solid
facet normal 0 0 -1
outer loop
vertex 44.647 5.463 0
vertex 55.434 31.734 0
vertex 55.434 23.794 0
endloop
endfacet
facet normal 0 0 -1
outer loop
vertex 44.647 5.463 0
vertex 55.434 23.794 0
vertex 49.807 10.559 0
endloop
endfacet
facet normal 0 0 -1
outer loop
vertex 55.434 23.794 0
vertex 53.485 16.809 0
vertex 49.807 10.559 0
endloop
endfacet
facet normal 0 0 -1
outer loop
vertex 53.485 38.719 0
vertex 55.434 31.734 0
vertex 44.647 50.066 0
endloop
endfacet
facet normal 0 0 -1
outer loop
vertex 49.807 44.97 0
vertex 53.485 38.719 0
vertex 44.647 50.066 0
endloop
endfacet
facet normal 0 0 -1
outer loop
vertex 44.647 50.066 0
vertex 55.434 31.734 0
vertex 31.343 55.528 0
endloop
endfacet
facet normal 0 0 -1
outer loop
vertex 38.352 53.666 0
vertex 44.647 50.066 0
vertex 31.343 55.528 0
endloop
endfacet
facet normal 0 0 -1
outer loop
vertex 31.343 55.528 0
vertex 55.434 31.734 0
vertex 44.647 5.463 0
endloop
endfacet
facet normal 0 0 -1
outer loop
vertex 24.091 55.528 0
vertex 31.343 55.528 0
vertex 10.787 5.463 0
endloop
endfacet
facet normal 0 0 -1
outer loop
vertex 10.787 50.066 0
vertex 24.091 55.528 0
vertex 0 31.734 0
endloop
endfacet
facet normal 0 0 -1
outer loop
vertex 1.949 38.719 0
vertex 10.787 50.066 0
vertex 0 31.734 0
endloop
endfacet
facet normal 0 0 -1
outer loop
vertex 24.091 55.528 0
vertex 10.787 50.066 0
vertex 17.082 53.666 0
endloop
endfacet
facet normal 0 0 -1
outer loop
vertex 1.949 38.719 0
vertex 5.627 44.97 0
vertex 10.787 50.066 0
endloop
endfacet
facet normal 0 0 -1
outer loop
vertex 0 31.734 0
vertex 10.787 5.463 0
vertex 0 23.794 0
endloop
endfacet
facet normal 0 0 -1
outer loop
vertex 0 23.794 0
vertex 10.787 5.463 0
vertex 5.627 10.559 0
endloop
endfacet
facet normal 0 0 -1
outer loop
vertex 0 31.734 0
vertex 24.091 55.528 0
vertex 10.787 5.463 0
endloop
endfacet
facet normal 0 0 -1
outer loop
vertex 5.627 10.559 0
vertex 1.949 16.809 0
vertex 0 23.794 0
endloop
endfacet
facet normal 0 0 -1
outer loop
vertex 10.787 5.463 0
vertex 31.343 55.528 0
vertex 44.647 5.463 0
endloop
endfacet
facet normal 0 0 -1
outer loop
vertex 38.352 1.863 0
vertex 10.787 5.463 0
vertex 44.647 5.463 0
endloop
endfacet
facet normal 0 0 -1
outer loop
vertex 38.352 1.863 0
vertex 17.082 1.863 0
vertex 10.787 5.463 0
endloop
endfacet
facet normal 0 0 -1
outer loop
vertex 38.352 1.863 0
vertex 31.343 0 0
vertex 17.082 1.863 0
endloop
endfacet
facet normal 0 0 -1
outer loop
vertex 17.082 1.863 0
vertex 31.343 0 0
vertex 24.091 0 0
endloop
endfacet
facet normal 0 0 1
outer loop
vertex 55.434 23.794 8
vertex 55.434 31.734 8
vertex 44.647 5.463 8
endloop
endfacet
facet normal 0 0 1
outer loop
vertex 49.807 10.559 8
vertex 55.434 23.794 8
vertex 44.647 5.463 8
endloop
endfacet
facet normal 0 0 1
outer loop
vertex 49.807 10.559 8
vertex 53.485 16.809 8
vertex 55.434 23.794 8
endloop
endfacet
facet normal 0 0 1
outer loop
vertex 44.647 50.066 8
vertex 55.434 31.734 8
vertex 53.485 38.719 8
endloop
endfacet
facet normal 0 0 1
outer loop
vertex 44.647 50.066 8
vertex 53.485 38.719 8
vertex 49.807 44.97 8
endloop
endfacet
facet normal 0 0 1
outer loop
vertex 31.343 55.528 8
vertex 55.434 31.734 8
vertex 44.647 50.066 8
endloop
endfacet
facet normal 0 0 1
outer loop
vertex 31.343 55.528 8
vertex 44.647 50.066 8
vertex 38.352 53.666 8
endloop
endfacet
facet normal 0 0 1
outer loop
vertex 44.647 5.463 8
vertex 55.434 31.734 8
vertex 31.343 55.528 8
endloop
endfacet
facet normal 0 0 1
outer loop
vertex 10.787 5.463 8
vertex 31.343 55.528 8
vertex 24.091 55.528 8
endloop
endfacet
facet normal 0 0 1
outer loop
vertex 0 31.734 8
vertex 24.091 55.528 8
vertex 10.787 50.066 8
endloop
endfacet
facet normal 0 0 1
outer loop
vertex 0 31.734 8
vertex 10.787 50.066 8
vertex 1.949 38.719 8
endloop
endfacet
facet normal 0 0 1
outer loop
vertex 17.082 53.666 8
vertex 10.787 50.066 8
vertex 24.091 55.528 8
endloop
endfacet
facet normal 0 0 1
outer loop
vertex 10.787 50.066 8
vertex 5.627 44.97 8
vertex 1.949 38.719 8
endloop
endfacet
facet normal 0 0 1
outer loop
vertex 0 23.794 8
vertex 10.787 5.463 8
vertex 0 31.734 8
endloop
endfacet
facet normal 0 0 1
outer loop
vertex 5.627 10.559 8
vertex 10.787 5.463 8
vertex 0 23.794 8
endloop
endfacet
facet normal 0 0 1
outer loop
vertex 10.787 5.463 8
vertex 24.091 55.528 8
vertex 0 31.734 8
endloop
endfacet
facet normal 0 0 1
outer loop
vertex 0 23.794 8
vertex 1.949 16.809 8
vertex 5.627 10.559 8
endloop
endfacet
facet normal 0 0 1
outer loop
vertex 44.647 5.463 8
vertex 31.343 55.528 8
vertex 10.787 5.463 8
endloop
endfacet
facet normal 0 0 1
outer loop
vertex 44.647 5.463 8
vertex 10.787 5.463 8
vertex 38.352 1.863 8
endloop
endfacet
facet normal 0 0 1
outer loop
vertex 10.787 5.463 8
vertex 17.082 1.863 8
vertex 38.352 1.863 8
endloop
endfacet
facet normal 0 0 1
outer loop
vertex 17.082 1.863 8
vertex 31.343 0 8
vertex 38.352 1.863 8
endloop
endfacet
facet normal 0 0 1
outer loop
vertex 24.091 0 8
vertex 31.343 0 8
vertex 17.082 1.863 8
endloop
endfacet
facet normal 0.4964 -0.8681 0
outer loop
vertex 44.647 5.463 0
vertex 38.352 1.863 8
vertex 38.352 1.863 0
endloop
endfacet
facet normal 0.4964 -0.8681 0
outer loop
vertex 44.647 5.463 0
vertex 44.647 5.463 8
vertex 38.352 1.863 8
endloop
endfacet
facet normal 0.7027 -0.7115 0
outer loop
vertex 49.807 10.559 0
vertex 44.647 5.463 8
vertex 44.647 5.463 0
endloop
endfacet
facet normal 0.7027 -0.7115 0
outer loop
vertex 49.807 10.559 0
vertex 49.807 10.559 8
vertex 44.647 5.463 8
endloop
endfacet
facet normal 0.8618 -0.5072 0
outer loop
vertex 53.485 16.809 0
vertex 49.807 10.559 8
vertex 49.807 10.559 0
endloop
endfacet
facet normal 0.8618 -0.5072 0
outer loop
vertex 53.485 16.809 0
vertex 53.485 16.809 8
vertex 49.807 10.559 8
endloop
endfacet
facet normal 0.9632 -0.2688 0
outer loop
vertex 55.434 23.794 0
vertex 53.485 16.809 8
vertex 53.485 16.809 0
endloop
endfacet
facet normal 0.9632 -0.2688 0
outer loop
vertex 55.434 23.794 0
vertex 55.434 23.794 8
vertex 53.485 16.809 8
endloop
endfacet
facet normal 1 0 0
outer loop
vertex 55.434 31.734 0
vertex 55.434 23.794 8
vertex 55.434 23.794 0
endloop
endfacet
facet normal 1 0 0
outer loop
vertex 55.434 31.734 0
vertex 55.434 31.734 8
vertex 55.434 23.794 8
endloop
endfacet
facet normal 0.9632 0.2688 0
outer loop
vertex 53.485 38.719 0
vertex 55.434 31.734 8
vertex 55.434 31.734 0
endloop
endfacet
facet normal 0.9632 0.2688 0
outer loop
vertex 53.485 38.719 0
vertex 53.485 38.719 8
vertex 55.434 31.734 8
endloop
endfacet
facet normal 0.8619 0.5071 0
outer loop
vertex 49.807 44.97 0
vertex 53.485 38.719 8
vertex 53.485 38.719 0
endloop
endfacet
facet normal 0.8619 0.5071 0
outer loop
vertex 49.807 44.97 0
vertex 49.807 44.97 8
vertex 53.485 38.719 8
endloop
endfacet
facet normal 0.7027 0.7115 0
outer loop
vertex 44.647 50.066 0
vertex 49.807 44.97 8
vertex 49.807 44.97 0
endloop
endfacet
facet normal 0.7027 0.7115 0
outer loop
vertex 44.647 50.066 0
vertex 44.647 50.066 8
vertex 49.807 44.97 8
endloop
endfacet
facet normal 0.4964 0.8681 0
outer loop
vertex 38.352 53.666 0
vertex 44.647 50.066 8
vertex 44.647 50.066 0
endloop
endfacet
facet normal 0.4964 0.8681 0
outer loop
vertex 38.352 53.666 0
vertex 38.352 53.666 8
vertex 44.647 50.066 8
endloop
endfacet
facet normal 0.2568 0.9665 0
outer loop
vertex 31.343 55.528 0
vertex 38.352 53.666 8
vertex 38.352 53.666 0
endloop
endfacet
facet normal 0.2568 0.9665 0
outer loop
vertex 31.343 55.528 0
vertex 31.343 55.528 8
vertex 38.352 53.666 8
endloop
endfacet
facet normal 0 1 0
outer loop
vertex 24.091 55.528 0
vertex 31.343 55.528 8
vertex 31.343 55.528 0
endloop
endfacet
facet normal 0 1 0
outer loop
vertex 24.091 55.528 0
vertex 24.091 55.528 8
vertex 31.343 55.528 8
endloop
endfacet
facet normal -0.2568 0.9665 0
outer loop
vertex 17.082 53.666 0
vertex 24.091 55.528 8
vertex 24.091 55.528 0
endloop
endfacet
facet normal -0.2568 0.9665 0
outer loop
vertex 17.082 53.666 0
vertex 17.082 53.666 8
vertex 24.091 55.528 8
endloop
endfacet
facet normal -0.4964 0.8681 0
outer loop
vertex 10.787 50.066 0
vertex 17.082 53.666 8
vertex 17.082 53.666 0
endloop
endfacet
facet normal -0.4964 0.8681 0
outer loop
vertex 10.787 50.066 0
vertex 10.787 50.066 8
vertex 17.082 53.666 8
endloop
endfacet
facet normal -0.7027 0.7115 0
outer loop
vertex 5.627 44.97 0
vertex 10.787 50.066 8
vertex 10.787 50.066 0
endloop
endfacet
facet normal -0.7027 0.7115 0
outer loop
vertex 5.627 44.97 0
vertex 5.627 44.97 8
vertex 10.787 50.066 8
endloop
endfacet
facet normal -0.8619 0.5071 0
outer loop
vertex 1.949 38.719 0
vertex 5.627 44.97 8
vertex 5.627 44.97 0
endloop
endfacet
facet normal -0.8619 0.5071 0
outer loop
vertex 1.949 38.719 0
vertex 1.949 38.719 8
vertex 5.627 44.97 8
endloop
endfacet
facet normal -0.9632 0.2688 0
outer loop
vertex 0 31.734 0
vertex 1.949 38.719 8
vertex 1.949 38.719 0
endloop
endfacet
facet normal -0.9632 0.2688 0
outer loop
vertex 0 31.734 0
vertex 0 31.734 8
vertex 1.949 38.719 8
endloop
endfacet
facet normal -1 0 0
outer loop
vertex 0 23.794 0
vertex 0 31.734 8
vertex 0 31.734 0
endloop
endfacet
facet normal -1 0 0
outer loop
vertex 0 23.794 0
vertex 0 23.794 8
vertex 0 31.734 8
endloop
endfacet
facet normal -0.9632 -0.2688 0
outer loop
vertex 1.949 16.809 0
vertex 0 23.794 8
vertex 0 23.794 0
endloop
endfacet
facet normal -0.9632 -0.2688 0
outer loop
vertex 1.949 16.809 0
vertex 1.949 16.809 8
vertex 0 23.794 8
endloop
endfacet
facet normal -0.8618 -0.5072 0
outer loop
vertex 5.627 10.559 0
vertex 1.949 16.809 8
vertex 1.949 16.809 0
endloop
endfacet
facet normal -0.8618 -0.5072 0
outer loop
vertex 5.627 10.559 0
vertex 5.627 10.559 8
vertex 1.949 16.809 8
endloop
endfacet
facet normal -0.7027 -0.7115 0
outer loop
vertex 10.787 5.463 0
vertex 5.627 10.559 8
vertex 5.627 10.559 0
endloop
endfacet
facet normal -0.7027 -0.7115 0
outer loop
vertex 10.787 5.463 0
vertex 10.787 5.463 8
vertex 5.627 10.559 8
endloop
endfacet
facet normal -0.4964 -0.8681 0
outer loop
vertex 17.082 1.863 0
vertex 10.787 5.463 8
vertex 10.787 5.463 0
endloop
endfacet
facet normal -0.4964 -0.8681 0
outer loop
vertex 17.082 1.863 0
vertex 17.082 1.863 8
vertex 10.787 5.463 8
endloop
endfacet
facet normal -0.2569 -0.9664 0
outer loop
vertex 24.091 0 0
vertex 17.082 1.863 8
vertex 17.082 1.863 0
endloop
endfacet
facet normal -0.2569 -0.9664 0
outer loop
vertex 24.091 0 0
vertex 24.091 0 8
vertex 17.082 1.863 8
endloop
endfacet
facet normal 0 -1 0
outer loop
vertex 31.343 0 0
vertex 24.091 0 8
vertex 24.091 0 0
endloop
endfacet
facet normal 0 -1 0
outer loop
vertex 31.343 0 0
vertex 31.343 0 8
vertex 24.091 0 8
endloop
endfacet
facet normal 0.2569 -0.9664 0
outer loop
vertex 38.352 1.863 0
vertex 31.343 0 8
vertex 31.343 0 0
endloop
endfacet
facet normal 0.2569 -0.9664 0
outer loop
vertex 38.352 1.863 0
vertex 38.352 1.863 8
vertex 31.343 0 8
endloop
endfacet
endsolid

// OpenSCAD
$fn = 32;

// ----------------------------------------------------------------------
// Flat adaptor: double_d, 8 mm thick
// ----------------------------------------------------------------------

// --- parameters (mm) ---
profile_height = 8;       // extrusion height
profile_points = 24;      // points of the closed outline

profile = [[55.434, 31.734], [53.485, 38.719], [49.807, 44.97], [44.647, 50.066], [38.352, 53.666], [31.343, 55.528], [24.091, 55.528], [17.082, 53.666], [10.787, 50.066], [5.627, 44.97], [1.949, 38.719], [0, 31.734], [0, 23.794], [1.949, 16.809], [5.627, 10.559], [10.787, 5.463], [17.082, 1.863], [24.091, 0], [31.343, 0], [38.352, 1.863], [44.647, 5.463], [49.807, 10.559], [53.485, 16.809], [55.434, 23.794]];  // single closed polygon, 24 points, counter clockwise

// --- the one profile operation ---
linear_extrude(height = profile_height) polygon(points = profile);
